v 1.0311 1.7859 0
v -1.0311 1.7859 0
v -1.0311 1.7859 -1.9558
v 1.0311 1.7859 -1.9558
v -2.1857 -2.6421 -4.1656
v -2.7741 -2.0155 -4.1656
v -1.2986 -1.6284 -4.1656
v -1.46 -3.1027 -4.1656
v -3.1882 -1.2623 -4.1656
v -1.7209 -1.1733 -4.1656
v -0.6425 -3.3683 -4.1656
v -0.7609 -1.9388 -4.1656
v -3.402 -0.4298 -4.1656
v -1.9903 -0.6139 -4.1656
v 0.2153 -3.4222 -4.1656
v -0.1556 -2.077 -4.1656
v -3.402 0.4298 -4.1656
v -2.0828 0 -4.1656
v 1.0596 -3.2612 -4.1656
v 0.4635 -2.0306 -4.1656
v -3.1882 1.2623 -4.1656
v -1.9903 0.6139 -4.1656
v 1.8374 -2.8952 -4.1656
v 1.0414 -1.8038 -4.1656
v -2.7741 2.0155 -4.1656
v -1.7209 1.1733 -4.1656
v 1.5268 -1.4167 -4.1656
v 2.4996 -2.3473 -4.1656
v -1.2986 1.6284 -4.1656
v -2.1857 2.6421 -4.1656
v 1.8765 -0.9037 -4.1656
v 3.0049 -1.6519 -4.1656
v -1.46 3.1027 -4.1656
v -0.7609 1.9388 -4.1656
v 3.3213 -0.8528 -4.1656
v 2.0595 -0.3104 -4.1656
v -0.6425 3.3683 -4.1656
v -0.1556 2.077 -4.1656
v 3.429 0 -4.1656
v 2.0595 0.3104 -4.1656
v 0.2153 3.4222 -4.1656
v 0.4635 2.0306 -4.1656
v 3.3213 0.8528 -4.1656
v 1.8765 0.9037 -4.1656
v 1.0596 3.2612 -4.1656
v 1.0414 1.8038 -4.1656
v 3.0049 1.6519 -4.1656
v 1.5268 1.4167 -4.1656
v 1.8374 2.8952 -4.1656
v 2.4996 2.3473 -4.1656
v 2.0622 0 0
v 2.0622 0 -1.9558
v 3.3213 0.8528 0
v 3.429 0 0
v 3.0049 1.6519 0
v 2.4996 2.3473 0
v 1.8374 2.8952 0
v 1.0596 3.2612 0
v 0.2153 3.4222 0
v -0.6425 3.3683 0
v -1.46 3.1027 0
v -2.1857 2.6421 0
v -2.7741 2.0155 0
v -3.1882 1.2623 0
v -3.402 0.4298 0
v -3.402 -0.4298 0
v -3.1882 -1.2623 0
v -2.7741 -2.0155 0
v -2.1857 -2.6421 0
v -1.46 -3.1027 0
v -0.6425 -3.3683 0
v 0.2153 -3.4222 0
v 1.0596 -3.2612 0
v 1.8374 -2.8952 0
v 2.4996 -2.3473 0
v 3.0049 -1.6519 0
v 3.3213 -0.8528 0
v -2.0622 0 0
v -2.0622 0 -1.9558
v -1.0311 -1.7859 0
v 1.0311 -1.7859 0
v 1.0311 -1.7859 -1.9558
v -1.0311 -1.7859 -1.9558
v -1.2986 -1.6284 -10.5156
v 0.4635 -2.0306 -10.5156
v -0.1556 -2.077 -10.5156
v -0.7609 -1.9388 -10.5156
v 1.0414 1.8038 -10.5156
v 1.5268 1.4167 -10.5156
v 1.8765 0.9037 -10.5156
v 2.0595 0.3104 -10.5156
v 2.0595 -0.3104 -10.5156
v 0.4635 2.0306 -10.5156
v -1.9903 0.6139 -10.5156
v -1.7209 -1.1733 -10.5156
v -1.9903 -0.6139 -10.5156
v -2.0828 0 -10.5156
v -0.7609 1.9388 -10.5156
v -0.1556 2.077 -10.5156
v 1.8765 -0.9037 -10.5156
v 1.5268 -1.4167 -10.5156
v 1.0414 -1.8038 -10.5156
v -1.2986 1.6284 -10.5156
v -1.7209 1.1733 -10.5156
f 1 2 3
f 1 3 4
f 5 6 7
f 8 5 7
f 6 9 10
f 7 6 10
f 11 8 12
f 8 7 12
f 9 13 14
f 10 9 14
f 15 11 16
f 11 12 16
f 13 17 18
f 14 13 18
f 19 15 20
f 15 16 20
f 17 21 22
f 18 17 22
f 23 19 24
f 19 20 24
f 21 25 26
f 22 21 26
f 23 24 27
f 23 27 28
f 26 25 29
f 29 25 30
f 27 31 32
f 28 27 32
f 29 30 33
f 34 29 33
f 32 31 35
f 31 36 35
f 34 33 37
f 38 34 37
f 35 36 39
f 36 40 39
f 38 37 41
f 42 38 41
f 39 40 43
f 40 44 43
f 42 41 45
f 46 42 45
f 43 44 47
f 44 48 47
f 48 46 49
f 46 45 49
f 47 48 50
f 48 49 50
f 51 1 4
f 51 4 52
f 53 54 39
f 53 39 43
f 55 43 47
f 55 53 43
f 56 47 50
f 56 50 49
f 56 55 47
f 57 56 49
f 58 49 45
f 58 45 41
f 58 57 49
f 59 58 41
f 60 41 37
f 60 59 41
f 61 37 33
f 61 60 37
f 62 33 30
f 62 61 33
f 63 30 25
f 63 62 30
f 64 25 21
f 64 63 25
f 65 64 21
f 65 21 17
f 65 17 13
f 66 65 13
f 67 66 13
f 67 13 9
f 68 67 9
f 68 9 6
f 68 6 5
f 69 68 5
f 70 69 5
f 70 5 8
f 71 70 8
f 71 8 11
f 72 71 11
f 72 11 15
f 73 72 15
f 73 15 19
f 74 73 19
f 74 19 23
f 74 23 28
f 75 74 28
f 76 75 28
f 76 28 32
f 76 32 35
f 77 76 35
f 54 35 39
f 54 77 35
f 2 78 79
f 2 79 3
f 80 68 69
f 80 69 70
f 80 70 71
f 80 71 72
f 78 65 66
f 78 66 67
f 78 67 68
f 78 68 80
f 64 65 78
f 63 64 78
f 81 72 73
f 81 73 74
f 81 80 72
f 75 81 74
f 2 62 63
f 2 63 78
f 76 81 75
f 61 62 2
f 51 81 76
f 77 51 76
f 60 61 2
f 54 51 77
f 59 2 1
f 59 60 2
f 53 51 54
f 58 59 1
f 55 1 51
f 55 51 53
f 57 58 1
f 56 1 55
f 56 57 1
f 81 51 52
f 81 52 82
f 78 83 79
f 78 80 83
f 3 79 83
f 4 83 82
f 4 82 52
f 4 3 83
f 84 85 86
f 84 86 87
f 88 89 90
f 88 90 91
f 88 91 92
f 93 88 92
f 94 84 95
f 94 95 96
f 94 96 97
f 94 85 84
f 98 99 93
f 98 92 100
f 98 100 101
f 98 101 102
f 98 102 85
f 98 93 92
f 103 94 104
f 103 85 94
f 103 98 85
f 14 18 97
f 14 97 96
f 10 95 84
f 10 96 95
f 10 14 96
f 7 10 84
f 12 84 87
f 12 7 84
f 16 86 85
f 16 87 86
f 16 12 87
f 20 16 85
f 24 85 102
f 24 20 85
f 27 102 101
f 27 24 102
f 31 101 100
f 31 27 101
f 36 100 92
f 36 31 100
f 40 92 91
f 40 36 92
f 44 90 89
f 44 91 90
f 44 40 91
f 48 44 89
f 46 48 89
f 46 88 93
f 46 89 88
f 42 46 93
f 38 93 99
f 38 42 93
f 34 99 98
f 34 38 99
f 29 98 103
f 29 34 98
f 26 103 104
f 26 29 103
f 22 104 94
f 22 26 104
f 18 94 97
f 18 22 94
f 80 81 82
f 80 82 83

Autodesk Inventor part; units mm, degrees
ref_plane "YZ Plane" through (0, 0, 0) normal (1, 0, 0) x (0, 1, 0)
ref_plane "XZ Plane" through (0, 0, 0) normal (0, 1, 0) x (-1, 0, 0)
ref_plane "XY Plane" through (0, 0, 0) normal (0, 0, 1) x (1, 0, 0)
sketch "Sketch1" plane through (0, 0, 0) normal (0, 0, 1) x (1, 0, 0)
  circle A0 centre (0, 0) radius 3.429
  dimension "head_dia" = 6.858
extrude "Extrusion1" add sketch "Sketch1" against normal blind 4.1656
sketch "Sketch2" plane through (0, 0, -4.1656) normal (0, 0, -1) x (-1, 0, 0)
  circle A0 centre (0, 0) radius 2.0828
  dimension "body_dia" = 4.1656
extrude "Extrusion2" add sketch "Sketch2" along normal blind 6.35
sketch "Sketch3" plane through (0, 0, 0) normal (0, 0, 1) x (1, 0, 0)
  line L0 (2.0622, 0) -> (1.0311, -1.7859)
  line L1 (1.0311, -1.7859) -> (-1.0311, -1.7859)
  line L2 (-1.0311, -1.7859) -> (-2.0622, 0)
  line L3 (-2.0622, 0) -> (-1.0311, 1.7859)
  line L4 (-1.0311, 1.7859) -> (1.0311, 1.7859)
  line L5 (1.0311, 1.7859) -> (2.0622, 0)
  point P0 (0, 0)
  point P1 (0, 0)
  dimension "allen" = 3.5719
extrude "Extrusion3" cut sketch "Sketch3" against normal blind 1.9558
properties part number "shcs-8-0250"
